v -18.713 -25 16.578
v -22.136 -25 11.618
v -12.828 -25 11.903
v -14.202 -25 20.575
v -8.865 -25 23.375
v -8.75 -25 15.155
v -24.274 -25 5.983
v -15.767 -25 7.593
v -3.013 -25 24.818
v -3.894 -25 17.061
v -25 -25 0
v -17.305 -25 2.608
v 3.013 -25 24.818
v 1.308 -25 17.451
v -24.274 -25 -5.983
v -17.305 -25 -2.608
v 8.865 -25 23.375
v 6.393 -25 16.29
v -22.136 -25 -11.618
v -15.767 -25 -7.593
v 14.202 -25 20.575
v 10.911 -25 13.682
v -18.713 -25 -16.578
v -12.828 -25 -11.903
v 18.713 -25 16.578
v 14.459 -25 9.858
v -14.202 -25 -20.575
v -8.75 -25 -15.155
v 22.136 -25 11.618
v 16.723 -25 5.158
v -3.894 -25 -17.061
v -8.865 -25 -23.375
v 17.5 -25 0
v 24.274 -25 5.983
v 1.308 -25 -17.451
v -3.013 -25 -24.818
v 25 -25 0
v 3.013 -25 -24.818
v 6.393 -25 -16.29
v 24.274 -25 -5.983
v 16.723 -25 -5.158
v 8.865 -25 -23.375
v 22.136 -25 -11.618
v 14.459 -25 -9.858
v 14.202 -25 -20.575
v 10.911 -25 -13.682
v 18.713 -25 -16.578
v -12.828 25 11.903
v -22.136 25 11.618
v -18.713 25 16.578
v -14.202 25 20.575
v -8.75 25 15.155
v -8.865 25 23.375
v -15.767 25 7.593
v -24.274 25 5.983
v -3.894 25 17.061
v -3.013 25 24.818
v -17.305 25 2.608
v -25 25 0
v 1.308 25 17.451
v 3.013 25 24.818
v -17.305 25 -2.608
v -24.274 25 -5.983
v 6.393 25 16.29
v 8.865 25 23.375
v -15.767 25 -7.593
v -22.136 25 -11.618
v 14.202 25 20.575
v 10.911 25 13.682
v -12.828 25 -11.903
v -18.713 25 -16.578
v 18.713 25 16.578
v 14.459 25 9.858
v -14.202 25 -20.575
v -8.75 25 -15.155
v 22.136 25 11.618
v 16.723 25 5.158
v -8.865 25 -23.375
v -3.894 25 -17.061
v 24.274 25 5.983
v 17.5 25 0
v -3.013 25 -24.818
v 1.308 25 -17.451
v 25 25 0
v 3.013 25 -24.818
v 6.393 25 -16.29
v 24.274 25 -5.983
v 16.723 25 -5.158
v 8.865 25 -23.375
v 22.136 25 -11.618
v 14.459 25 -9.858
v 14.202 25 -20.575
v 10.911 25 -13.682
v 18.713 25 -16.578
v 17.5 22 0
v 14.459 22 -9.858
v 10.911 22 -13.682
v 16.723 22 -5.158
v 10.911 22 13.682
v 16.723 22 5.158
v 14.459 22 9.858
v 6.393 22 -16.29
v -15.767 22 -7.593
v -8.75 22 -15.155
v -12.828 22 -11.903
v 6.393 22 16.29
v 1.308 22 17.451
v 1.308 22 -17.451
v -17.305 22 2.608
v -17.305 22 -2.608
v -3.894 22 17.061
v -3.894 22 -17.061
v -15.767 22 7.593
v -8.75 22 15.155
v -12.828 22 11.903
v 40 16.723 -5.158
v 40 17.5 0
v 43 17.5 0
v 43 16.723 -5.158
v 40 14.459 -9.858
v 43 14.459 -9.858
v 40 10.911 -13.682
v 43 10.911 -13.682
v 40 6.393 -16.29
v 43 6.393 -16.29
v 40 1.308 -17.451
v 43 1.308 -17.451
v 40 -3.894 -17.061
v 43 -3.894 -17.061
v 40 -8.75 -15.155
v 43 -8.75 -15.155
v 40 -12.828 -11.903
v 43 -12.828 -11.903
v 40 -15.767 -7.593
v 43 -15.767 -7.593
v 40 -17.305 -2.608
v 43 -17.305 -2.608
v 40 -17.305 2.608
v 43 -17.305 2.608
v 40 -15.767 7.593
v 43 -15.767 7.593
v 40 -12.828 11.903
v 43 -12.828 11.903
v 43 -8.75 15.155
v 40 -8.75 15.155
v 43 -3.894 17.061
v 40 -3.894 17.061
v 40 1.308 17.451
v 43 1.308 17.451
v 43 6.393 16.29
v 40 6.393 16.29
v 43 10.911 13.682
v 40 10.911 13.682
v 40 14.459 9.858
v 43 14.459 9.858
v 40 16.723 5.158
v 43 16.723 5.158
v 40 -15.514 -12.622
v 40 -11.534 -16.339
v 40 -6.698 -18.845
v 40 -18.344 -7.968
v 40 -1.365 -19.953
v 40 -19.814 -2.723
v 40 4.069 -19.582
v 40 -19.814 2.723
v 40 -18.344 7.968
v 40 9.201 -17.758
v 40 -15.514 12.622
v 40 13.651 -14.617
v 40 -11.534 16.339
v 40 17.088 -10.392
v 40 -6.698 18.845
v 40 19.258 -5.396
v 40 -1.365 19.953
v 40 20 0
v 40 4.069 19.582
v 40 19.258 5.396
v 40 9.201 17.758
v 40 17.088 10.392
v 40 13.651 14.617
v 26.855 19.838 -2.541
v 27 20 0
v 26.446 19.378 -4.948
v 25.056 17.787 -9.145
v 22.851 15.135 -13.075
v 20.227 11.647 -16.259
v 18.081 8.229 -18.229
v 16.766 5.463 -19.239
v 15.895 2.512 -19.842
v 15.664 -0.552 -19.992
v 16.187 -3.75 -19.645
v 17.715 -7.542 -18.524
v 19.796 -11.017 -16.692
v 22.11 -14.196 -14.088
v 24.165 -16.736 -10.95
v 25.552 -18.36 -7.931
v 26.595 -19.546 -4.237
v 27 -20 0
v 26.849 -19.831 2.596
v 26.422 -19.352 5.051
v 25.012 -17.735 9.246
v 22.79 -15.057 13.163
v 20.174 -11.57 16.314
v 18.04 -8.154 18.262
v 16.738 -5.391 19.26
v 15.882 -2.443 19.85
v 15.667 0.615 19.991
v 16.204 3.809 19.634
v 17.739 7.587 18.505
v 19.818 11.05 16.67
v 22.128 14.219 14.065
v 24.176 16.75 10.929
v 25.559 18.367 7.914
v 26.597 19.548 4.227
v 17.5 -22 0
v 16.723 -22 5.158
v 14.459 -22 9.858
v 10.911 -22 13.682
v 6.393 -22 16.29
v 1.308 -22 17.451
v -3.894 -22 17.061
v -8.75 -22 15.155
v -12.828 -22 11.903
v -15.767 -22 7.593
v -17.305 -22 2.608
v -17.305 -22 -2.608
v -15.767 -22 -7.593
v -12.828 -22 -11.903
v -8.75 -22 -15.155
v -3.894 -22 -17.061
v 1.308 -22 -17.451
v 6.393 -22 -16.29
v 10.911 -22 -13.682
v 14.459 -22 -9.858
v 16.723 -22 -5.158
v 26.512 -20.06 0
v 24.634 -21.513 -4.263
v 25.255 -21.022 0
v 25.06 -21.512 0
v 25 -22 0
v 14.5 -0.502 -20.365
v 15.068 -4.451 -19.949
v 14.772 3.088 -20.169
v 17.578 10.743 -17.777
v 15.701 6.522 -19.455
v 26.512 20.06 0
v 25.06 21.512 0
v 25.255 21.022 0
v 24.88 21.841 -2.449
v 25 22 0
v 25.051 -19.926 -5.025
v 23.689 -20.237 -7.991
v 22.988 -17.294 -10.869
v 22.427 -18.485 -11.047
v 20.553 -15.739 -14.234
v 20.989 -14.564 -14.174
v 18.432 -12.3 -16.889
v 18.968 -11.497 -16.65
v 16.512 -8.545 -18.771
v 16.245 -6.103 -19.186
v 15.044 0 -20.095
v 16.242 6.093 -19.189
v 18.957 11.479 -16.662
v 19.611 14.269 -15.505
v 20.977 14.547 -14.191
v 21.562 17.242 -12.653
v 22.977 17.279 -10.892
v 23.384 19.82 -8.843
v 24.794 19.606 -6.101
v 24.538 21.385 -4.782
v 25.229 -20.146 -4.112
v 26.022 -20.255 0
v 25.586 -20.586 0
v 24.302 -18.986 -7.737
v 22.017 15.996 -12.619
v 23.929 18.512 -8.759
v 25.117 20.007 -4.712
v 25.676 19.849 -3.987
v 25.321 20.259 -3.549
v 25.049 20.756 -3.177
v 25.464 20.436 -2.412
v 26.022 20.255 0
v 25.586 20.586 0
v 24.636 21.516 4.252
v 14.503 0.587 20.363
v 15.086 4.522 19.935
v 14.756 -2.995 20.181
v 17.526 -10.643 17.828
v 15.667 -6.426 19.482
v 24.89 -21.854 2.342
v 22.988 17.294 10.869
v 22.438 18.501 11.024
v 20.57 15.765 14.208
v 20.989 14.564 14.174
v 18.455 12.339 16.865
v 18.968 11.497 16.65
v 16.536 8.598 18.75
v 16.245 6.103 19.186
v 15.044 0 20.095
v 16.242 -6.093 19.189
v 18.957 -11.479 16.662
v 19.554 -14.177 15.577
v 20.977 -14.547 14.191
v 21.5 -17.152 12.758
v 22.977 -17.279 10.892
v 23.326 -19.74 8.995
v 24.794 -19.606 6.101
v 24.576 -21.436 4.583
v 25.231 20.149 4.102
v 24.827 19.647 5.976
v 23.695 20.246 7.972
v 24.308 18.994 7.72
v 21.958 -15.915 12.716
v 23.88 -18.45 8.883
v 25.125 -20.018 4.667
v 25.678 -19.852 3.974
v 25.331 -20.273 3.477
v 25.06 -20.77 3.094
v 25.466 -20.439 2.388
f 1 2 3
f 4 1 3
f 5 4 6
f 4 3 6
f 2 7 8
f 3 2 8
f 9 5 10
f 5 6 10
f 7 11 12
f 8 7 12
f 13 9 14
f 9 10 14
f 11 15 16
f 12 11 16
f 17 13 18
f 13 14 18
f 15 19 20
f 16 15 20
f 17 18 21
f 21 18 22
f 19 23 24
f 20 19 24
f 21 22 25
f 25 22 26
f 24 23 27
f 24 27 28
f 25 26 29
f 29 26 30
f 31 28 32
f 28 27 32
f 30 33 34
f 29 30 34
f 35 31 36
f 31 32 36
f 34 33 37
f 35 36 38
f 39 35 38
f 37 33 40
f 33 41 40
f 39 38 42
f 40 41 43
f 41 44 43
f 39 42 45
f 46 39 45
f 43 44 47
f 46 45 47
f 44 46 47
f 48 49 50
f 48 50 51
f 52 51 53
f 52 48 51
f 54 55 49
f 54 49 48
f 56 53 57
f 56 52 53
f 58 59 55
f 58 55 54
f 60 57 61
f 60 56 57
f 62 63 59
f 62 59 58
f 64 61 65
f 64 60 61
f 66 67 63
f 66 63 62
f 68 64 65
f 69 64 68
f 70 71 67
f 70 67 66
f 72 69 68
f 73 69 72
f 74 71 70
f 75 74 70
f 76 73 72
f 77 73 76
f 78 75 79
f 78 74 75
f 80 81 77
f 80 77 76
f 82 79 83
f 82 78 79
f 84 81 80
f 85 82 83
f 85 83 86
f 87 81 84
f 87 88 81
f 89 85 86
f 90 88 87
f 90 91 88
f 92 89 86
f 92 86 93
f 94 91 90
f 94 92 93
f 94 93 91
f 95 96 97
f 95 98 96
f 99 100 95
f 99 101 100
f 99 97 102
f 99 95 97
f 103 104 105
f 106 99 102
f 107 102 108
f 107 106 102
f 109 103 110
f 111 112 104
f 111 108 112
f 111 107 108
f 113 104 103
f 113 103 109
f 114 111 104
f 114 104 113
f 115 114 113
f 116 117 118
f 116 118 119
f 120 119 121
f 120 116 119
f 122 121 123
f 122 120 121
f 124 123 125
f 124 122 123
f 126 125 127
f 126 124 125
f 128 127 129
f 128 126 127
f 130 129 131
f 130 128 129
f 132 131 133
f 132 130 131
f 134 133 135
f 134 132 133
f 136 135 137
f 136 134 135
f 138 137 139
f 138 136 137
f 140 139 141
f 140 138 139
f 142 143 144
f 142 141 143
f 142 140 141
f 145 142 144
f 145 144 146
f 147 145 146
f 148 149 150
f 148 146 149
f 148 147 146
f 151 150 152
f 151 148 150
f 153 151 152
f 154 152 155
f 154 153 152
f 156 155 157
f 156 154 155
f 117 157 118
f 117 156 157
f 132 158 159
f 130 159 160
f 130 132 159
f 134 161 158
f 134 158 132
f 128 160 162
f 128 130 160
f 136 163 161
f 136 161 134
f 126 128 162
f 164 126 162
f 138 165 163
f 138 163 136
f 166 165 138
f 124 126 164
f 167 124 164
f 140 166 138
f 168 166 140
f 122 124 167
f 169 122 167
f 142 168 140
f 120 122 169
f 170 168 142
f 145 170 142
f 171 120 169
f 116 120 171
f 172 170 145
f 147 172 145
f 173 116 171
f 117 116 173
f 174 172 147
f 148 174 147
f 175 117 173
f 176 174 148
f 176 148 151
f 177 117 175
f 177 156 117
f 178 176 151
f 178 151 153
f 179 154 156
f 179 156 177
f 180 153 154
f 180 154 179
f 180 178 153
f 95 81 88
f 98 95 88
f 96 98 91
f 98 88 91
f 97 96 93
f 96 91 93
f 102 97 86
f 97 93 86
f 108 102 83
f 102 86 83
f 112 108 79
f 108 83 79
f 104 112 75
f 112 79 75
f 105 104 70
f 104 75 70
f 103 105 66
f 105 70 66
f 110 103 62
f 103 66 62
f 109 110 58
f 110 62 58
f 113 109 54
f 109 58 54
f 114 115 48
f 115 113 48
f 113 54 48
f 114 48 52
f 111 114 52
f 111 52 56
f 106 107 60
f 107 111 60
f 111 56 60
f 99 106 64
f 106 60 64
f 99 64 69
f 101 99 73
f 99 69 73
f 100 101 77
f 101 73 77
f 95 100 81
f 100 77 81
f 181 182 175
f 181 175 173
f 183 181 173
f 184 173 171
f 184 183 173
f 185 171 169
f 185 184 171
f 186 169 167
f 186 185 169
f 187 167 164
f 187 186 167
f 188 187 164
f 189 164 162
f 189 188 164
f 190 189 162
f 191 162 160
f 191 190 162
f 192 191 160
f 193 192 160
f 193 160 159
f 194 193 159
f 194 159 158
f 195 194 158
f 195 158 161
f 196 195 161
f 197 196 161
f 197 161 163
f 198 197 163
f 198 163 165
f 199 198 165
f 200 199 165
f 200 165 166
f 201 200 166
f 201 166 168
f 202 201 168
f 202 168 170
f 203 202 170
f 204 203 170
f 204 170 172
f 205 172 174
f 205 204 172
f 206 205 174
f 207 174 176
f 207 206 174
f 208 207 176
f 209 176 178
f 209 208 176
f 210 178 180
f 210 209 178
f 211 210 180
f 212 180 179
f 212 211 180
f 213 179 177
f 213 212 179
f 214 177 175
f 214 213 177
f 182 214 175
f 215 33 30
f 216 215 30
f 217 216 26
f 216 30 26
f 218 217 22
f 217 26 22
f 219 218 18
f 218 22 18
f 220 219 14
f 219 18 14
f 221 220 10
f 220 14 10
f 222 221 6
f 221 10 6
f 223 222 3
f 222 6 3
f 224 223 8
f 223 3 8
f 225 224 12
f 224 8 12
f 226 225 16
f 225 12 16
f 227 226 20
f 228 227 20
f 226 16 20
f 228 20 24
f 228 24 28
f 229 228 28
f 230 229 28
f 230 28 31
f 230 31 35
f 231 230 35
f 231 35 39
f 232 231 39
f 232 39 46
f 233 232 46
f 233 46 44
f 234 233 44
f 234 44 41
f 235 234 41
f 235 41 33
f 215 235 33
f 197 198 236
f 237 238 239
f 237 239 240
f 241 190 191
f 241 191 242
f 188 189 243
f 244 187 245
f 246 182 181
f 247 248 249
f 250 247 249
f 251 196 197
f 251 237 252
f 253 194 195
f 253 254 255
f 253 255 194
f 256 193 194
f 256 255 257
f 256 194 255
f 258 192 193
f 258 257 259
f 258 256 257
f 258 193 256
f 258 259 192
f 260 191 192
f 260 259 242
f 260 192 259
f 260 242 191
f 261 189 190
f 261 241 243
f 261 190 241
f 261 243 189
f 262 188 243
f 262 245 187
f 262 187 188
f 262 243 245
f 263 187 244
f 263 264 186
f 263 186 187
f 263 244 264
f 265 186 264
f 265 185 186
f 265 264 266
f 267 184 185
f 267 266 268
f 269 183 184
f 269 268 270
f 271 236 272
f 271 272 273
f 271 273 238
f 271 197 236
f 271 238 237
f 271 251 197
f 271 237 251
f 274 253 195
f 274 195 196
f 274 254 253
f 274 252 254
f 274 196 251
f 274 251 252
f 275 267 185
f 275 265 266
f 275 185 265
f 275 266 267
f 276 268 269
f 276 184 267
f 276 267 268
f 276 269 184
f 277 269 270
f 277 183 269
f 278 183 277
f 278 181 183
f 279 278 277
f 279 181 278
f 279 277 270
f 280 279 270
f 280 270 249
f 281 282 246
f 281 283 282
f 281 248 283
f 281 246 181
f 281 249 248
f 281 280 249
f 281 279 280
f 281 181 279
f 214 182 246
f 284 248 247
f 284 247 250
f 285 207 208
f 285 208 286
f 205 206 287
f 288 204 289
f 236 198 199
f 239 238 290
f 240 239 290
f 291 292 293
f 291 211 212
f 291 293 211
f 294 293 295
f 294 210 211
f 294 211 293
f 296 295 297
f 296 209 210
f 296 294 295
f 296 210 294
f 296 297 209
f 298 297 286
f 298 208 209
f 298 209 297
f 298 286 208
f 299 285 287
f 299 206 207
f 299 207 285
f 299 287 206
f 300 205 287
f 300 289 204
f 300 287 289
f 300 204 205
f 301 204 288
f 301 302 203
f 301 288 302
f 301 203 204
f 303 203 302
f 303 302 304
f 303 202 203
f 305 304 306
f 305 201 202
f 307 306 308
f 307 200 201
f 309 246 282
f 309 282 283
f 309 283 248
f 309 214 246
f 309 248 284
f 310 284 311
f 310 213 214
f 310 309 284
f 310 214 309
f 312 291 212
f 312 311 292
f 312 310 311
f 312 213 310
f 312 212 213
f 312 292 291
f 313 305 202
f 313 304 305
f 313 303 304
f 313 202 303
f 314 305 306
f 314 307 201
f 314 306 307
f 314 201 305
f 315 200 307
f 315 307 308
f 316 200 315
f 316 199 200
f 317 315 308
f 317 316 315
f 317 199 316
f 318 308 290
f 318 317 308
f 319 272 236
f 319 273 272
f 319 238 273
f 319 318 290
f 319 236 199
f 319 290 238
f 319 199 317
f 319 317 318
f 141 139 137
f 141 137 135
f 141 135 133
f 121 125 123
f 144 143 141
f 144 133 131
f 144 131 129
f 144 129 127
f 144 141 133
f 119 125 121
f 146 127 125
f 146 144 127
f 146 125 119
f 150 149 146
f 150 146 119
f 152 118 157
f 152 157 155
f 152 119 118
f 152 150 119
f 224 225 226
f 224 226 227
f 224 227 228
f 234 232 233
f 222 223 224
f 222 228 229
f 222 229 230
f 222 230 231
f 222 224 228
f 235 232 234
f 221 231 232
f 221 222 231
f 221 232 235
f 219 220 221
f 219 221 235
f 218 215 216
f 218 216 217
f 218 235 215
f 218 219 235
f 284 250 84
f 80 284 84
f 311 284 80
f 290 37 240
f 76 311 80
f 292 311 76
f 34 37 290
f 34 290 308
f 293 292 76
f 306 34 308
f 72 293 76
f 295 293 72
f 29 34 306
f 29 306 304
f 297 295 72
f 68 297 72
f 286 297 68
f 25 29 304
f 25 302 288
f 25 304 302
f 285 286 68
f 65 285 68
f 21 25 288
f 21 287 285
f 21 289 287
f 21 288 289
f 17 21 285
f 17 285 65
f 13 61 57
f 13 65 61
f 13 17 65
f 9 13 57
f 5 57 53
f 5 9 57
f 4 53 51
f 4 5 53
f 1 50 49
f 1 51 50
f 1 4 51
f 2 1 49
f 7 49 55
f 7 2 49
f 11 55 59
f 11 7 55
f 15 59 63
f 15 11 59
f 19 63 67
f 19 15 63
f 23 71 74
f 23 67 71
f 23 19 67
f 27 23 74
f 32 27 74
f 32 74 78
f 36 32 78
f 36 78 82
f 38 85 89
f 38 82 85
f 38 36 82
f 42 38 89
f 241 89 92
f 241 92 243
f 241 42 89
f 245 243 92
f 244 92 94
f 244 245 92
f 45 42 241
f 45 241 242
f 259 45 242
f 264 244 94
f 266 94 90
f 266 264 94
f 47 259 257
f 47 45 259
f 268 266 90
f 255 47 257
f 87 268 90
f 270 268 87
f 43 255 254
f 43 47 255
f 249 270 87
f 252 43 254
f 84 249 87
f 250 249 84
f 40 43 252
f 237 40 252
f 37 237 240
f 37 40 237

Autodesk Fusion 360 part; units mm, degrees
sketch "Sketch1" plane through (0, 0, 0) normal (0, 1, 0) x (1, 0, 0)
  circle A0 centre (0, 0) radius 25
  dimension "d1" = 50
extrude "Extrude2" add sketch "Sketch1" along normal mid plane 50
sketch "Sketch2" plane through (0, -25, 0) normal (0, -1, 0) x (1, 0, 0)
  circle A0 centre (0, 0) radius 25
  circle A1 centre (0, 0) radius 17.5
  dimension "d6" = 35
extrude "Extrude3" cut sketch "Sketch2" against normal blind 3 contours A1
mirror "Mirror1" about plane through (0, 0, 0) normal (0, 1, 0) of "Extrude3"
sketch "Sketch3" plane through (0, 0, 0) normal (1, 0, 0) x (0, 1, 0)
  circle A0 centre (0, 0) radius 20
  dimension "d11" = 40
extrude "Extrude4" add sketch "Sketch3" along normal blind 40
sketch "Sketch4" plane through (40, 0, 0) normal (1, 0, 0) x (0, 1, 0)
  circle A0 centre (0, 0) radius 20
  circle A1 centre (0, 0) radius 17.5
  dimension "d14" = 35
extrude "Extrude5" add sketch "Sketch4" along normal blind 3 contours A1
fillet "Fillet1" radius 2 1 edges at (15, 0, 20)
